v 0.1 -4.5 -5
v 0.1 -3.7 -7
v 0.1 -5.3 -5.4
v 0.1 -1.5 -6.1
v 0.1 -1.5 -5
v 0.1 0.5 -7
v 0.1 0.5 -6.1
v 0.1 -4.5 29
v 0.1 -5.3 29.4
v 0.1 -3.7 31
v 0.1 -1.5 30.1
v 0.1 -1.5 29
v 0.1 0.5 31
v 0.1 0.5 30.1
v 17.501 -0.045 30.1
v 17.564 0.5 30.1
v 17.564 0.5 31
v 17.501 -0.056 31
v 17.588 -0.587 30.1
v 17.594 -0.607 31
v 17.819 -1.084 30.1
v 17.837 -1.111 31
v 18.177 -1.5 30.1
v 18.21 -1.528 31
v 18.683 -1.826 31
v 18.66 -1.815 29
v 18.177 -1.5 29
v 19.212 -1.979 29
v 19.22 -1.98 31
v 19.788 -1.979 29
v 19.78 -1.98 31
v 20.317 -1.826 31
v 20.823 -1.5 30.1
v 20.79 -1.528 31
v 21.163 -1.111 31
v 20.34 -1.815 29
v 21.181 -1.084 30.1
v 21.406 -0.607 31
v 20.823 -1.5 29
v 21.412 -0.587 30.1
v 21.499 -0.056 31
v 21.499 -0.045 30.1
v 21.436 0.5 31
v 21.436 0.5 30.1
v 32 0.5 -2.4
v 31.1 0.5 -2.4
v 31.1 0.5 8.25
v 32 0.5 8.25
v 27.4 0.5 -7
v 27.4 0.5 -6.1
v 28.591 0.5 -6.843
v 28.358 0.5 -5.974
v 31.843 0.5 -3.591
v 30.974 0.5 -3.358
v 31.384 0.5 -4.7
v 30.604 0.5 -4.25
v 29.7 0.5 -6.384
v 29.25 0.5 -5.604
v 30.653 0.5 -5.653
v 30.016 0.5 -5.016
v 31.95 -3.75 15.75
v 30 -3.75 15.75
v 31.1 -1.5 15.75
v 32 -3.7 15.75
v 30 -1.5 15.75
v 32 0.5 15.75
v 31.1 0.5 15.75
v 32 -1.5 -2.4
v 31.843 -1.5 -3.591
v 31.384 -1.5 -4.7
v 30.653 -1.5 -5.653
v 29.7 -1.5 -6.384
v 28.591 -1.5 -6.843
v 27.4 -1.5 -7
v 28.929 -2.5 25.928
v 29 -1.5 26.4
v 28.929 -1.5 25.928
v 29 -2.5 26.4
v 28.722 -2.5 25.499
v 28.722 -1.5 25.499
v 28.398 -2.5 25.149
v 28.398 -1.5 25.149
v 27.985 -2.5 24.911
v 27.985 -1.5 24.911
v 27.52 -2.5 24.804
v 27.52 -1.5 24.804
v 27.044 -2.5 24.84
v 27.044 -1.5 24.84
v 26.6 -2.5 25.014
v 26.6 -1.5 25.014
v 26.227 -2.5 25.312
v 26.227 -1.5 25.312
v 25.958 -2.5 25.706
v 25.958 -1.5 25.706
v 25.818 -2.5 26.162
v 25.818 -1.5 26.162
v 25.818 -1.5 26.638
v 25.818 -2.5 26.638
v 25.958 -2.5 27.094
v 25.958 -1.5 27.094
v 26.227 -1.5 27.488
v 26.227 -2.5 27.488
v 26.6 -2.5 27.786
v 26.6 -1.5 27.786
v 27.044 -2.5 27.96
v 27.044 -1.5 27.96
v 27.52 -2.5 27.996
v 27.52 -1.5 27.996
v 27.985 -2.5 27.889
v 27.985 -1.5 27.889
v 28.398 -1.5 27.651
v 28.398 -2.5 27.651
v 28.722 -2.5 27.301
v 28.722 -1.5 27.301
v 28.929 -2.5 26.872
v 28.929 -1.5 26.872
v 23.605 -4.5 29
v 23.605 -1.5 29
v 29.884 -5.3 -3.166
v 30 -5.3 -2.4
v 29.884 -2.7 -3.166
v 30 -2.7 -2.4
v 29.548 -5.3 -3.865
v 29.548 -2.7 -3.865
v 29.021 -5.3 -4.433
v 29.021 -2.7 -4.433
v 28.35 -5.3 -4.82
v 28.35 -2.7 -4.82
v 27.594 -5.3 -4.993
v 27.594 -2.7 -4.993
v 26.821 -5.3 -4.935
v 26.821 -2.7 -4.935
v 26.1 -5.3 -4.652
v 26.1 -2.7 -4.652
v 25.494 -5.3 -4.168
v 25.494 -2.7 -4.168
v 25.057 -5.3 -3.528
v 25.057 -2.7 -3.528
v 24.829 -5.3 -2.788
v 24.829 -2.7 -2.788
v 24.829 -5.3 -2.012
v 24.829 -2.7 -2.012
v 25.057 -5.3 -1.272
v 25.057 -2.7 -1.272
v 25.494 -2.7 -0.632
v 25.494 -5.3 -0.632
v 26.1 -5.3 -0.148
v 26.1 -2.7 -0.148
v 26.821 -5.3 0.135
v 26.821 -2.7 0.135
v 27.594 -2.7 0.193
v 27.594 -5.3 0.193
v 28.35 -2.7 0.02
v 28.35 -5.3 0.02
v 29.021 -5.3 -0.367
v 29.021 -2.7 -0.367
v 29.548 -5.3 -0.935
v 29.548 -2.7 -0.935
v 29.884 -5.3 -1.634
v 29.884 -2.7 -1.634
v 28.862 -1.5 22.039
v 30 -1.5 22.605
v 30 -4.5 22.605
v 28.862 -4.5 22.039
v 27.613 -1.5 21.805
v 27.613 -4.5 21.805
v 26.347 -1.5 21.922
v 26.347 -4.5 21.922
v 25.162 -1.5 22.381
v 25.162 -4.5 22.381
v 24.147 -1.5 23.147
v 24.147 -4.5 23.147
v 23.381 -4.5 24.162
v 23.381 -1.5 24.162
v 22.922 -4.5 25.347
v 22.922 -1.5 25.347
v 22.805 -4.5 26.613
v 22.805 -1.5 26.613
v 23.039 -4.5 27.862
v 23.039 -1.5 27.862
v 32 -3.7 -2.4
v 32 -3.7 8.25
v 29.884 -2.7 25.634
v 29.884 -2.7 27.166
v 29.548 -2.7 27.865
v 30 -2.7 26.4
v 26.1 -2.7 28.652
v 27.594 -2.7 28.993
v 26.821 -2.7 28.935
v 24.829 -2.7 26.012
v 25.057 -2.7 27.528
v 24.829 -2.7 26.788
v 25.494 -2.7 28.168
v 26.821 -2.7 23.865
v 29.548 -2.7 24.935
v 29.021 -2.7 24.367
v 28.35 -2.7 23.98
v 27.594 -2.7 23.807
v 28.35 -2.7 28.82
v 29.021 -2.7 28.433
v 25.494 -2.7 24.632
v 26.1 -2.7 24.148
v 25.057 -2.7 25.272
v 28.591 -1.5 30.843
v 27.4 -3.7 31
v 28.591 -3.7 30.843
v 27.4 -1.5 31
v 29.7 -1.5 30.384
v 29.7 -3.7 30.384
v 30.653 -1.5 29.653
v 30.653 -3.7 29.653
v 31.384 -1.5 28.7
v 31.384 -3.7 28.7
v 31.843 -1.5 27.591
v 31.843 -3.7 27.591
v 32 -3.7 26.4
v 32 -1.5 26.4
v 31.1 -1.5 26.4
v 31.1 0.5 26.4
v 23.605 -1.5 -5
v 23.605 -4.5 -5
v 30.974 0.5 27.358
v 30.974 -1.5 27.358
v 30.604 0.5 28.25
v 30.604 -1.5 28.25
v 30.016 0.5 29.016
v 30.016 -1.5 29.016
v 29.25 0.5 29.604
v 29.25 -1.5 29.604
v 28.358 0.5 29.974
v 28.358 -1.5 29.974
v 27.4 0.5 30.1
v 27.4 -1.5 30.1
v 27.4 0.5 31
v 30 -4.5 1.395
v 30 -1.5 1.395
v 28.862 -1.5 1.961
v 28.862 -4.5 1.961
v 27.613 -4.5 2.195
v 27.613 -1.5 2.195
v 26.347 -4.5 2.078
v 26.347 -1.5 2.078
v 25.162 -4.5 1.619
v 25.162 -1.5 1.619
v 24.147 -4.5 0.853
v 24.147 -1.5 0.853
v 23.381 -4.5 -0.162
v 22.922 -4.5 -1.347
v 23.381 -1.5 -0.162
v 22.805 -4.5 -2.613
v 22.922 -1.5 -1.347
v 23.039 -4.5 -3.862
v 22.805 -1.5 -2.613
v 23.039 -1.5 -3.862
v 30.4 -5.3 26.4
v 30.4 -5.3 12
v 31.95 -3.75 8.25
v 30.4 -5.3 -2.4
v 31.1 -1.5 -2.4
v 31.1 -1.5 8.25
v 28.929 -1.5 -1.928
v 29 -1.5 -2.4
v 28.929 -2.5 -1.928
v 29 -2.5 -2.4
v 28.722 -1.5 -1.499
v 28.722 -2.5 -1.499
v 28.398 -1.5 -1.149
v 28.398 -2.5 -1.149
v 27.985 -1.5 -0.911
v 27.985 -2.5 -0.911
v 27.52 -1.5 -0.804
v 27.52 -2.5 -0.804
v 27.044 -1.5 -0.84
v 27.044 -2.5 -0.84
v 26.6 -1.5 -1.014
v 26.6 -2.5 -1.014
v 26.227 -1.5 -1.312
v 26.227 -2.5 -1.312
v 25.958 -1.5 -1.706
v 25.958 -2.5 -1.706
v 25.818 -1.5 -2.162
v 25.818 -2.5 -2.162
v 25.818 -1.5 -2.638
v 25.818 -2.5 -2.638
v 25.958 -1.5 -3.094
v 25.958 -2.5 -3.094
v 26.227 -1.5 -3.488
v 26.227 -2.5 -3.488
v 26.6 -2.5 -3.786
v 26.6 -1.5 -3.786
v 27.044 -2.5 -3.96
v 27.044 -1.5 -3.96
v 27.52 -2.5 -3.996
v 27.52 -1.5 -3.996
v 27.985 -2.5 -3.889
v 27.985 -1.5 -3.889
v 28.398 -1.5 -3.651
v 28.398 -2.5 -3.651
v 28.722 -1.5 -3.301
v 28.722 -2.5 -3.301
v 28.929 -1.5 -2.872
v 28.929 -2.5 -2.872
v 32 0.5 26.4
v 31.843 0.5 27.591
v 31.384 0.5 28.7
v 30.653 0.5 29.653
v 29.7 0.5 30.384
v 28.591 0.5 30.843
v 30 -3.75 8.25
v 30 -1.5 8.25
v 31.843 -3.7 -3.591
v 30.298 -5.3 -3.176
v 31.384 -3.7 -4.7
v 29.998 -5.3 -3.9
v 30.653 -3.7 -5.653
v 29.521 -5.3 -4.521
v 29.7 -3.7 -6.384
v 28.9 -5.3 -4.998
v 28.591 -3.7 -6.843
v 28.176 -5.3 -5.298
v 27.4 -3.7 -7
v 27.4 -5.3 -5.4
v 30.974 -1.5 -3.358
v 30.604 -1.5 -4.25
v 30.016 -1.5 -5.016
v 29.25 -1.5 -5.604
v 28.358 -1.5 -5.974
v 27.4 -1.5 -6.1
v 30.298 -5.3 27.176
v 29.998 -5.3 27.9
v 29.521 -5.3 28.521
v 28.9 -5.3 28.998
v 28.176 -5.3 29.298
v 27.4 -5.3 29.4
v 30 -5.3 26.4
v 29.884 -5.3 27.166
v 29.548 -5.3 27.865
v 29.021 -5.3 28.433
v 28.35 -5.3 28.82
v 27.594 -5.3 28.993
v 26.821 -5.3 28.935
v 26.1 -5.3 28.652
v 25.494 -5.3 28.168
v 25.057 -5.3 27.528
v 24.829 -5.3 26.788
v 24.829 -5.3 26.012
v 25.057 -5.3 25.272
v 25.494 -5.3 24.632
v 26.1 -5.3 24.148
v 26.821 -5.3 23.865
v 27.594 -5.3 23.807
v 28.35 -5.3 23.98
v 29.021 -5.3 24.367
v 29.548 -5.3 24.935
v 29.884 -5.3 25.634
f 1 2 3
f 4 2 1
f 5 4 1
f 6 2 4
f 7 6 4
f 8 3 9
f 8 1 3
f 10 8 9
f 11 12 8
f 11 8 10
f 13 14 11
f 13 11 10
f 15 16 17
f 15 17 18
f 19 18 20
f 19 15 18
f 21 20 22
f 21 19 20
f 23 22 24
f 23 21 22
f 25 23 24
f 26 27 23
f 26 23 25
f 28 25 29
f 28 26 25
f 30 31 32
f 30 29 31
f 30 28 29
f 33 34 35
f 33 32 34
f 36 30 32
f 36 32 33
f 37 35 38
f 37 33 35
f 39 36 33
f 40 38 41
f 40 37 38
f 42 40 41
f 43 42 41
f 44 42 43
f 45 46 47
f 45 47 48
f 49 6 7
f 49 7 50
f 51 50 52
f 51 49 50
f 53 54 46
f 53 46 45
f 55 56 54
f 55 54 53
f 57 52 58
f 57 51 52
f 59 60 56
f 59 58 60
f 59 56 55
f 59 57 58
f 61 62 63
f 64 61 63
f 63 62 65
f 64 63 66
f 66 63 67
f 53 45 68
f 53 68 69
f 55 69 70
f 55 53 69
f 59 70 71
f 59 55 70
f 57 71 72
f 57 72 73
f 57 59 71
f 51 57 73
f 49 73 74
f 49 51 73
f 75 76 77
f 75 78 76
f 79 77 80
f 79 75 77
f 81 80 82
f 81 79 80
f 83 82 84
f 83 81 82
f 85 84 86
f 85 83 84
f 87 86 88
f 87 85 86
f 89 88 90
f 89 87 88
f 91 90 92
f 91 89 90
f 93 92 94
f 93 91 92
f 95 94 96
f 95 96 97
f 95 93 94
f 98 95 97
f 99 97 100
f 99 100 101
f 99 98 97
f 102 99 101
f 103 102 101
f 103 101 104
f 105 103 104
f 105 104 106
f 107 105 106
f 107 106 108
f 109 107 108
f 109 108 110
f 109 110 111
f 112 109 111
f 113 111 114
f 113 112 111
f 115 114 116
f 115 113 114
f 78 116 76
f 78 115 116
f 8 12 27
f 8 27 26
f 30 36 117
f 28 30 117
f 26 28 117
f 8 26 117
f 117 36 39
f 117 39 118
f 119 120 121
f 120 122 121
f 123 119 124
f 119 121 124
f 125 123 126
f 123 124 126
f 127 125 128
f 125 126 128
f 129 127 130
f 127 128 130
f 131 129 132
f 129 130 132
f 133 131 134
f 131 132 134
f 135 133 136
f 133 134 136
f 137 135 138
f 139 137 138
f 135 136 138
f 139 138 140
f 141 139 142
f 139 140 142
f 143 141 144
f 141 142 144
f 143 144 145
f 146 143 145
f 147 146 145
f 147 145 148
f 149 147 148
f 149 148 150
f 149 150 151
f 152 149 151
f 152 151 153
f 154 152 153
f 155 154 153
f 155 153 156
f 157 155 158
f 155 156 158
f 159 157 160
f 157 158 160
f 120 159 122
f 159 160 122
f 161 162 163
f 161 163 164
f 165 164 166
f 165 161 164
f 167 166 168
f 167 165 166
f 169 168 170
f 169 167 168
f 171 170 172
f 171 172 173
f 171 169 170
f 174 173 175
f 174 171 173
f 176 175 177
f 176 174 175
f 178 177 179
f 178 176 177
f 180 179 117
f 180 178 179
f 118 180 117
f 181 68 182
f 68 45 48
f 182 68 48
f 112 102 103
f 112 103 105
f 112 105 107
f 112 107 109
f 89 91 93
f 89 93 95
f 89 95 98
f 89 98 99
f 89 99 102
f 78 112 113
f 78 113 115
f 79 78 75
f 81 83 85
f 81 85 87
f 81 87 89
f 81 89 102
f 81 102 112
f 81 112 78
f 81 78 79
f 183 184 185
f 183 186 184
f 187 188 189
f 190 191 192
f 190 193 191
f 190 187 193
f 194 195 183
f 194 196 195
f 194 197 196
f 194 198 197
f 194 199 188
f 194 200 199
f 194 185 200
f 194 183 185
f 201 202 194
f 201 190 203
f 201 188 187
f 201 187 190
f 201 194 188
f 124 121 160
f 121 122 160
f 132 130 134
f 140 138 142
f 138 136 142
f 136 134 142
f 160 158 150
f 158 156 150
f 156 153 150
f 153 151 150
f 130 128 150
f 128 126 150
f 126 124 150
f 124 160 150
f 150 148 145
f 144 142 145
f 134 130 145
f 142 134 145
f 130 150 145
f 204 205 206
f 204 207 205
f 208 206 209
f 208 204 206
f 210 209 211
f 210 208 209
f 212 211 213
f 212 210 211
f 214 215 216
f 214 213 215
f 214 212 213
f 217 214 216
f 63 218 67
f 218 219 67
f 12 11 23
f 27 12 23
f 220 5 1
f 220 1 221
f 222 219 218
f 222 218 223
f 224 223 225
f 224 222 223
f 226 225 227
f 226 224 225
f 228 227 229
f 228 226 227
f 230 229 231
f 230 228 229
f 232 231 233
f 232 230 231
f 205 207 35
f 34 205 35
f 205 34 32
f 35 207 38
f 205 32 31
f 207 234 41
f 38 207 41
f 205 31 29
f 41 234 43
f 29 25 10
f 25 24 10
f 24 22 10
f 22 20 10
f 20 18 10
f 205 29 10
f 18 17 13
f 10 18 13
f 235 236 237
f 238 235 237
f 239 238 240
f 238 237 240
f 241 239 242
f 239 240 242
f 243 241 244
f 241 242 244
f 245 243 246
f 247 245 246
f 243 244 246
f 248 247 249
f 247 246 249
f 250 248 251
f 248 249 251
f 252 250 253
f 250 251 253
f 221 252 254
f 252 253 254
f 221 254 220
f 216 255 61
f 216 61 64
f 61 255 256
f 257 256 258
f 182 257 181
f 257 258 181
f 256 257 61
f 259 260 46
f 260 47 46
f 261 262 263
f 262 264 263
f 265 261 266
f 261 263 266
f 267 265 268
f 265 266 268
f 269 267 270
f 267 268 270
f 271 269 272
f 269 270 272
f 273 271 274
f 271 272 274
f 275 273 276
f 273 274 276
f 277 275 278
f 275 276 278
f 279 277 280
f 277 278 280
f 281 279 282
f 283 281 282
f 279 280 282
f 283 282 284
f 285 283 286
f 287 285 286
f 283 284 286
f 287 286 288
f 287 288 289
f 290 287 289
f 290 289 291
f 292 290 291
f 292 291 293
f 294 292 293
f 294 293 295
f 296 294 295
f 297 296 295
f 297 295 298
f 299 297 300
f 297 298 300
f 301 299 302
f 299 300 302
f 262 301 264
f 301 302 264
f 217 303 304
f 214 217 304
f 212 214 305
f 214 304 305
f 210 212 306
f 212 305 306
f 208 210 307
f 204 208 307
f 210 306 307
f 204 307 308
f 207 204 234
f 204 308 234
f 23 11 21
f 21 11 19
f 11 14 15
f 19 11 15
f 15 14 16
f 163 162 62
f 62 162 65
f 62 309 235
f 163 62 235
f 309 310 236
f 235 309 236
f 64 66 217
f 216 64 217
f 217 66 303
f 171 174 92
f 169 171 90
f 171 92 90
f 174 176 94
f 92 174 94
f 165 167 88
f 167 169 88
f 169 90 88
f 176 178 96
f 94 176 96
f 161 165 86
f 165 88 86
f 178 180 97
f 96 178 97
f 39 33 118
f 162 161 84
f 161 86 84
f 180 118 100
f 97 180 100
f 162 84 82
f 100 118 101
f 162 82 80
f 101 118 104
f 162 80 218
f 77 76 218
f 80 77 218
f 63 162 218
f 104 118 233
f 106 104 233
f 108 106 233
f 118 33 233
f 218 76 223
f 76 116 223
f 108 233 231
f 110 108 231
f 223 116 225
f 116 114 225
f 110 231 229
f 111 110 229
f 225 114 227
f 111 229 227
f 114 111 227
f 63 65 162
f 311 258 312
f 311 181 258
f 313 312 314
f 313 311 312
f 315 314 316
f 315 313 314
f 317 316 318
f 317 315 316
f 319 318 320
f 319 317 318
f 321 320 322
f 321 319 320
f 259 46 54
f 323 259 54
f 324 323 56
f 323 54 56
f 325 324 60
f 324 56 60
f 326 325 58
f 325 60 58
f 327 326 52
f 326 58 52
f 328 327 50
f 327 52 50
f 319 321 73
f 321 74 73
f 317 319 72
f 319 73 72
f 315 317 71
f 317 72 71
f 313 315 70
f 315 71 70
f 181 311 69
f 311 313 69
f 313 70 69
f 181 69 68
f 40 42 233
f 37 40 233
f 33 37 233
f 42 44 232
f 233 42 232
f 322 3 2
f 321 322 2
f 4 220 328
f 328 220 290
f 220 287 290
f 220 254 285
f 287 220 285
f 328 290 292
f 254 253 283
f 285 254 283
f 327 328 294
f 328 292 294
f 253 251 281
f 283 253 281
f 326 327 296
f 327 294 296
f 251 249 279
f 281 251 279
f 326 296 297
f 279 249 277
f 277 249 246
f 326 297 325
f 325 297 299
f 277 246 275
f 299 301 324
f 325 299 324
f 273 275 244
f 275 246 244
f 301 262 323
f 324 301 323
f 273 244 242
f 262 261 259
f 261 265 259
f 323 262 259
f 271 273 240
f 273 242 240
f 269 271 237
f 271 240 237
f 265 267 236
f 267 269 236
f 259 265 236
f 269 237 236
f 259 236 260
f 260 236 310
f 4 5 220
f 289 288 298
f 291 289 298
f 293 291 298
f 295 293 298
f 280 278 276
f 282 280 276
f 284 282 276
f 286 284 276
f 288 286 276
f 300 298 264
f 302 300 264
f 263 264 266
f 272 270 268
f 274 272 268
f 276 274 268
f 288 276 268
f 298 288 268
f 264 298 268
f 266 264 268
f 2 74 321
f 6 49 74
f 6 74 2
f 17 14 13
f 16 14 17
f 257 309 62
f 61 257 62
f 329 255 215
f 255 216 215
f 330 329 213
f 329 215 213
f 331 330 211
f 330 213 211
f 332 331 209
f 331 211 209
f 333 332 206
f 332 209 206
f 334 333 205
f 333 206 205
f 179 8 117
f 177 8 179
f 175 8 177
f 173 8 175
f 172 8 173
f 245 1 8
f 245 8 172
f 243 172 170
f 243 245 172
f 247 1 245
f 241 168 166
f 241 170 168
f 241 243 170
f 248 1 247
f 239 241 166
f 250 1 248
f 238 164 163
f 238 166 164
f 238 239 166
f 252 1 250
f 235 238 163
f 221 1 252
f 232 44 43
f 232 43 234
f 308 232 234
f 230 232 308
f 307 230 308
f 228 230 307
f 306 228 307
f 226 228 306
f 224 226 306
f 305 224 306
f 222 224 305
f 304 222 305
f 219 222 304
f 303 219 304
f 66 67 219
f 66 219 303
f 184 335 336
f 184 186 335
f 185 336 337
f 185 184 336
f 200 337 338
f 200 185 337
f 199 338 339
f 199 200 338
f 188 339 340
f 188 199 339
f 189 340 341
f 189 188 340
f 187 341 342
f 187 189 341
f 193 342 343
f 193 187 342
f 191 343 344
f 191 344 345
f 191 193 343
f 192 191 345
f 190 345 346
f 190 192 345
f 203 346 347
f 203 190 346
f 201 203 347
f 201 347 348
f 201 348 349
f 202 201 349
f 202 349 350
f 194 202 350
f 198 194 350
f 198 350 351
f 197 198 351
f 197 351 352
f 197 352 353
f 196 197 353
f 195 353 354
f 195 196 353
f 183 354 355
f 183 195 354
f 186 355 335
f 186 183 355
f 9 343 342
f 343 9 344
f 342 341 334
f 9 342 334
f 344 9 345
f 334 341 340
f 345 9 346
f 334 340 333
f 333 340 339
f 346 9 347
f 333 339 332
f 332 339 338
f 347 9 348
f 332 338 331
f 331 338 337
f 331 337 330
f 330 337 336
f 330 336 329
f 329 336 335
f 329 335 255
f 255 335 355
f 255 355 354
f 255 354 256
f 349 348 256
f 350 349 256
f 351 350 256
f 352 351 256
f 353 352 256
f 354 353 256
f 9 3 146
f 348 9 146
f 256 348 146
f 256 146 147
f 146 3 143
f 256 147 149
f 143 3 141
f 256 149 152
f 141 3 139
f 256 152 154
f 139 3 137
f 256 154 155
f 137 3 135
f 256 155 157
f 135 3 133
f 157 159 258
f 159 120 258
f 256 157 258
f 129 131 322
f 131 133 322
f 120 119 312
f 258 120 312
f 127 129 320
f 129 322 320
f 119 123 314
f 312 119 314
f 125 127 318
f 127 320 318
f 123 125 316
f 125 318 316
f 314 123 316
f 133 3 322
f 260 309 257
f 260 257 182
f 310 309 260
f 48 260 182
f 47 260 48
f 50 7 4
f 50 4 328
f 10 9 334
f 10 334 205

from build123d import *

# Parameters (mm, degrees)
CYLINDER003_R     = 2
CYLINDER003_DEPTH = 10
CYLINDER001_R     = 2
CYLINDER001_DEPTH = 10
SKETCH037_W       = 7.5
SKETCH037_H       = 7.5
EXTRUDE045_DEPTH  = 10
SKETCH032_R       = 2.6
EXTRUDE043_DEPTH  = 0.8
EXTRUDE050_DEPTH  = 3
EXTRUDE051_DEPTH  = 0.8
EXTRUDE038_DEPTH  = 2


with BuildPart() as shutter_cable001:
    # Cylinder003 → Cylinder003 (new body)
    with BuildSketch(Plane(origin=(19.5, 0, 24.5), x_dir=(1, 0, 0), z_dir=(0, 0, 1))):
        Circle(CYLINDER003_R)
    extrude(amount=CYLINDER003_DEPTH)


with BuildPart() as battery_cable:
    # Cylinder001 → Cylinder001 (new body)
    with BuildSketch(Plane(origin=(-70.5, 0, 12), x_dir=(0, 0, 1), z_dir=(-1, 0, 0))):
        Circle(CYLINDER001_R)
    extrude(amount=CYLINDER001_DEPTH)


with BuildPart() as common_sub:
    # Sketch037 → Extrude045 (new body)
    with BuildSketch(Plane.YZ.offset(35)):
        with Locations((0, 12)):
            Rectangle(SKETCH037_W, SKETCH037_H)
    extrude(amount=EXTRUDE045_DEPTH)


with BuildPart() as common_sub_1:
    # Extrude045 placement: moved
    add(common_sub.part.moved(Location((-9.5, 0, 0))))

    # Fusion033: union shutter cable001, battery cable
    add(shutter_cable001.part)
    add(battery_cable.part)


with BuildPart() as sweep_body:
    # Sweep: sweep along a path in Sketch034
    with BuildLine(Plane.XZ.offset(10)) as sweep_path:
        Line((32, 12), (32, 26.4))
        ThreePointArc((32, 26.4), (30.652691, 29.652691), (27.4, 31))
        Line((27.4, 31), (-39.9, 31))
    # Sketch033 → Sweep (sweep)
    with BuildSketch(Plane.YZ):
        Polygon((-5.3, 29.4), (-3.7, 31), (-3.7, 32), (-6, 32), (-6, 29.4), align=None)
    sweep(path=sweep_path.line)


with BuildPart() as fusion:
    # Sketch032 → Extrude043 (new body)
    with BuildSketch(Plane.XZ.offset(10)):
        with Locations((27.4, 26.4)):
            Circle(SKETCH032_R)
    extrude(amount=EXTRUDE043_DEPTH)


with BuildPart() as fusion_1:
    # Extrude043 placement: moved
    add(fusion.part.moved(Location((0, 5.5, 0))))

    # Fusion: union Sweep body
    add(sweep_body.part)


with BuildPart() as screw_hole_bottom002:
    # Sketch003 → Revolve (revolve)
    with BuildSketch(Plane.XY):
        Polygon((1.6, 3), (1.6, 2), (0, 2), (0, 1.8), (2.6, 1.8), (2.6, 0), (4.6, 0), (4.6, 3), align=None)
    revolve(axis=Axis((0, 0, 0), (0, 1, 0)))


with BuildPart() as screw_hole_bottom002_1:
    # Body003 placement: moved
    add(screw_hole_bottom002.part.moved(Location((27.4, -4.5, 26.4))))


with BuildPart() as bottom009:
    # Sketch041 → Extrude050 (new body)
    with BuildSketch(Plane.XZ.offset(10)):
        with BuildLine():
            ThreePointArc((32, 26.4), (30.652691, 29.652691), (27.4, 31))
            Line((27.4, 31), (0.1, 31))
            Line((0.1, 31), (0.1, 29))
            Line((0.1, 29), (27.4, 29))
            ThreePointArc((30, 26.4), (29.238478, 28.238478), (27.4, 29))
            Line((30, 12), (30, 26.4))
            Line((32, 12), (30, 12))
            Line((32, 26.4), (32, 12))
        make_face()
    extrude(amount=EXTRUDE050_DEPTH)


with BuildPart() as bottom009_1:
    # Extrude050 placement: moved
    add(bottom009.part.moved(Location((0, 8.5, 0))))


with BuildPart() as bottom010:
    # Sketch042 → Extrude051 (new body)
    with BuildSketch(Plane.XZ.offset(10)):
        with BuildLine():
            ThreePointArc((32, 26.4), (30.652691, 29.652691), (27.4, 31))
            Line((27.4, 31), (0.1, 31))
            Line((0.1, 31), (0.1, 12))
            Line((0.1, 12), (32, 12))
            Line((32, 26.4), (32, 12))
        make_face()
    extrude(amount=EXTRUDE051_DEPTH)


with BuildPart() as bottom010_1:
    # Extrude051 placement: moved
    add(bottom010.part.moved(Location((0, 5.5, 0))))


with BuildPart() as bottom:
    # Sketch030 → Extrude038 (new body)
    with BuildSketch(Plane.XZ.offset(10)):
        with BuildLine():
            ThreePointArc((32, 26.4), (30.652691, 29.652691), (27.4, 31))
            Line((27.4, 31), (0.1, 31))
            Line((0.1, 31), (0.1, 30.1))
            Line((0.1, 30.1), (27.4, 30.1))
            ThreePointArc((31.1, 26.4), (30.016295, 29.016295), (27.4, 30.1))
            Line((31.1, 12), (31.1, 26.4))
            Line((32, 12), (31.1, 12))
            Line((32, 26.4), (32, 12))
        make_face()
    extrude(amount=EXTRUDE038_DEPTH)


with BuildPart() as bottom_1:
    # Extrude038 placement: moved
    add(bottom.part.moved(Location((0, 10.5, 0))))

    # Fusion029: union screw hole bottom002, bottom009, bottom010
    add(screw_hole_bottom002_1.part)
    add(bottom009_1.part)
    add(bottom010_1.part)

    # Cut: cut Fusion
    add(fusion_1.part, mode=Mode.SUBTRACT)


with BuildPart() as part_mirroring004:
    # Part__Mirroring004: instance of bottom
    add(bottom_1.part.mirror(Plane(origin=(0, 0, 12), x_dir=(0, 1, 0), z_dir=(0, 0, 1))))


with BuildPart() as bottom007:
    # Fusion031 base: copy of bottom
    add(bottom_1.part)

    # Fusion031: union Part__Mirroring004
    add(part_mirroring004.part)

    # Cut026: cut common sub
    add(common_sub_1.part, mode=Mode.SUBTRACT)


solid = bottom007.part
